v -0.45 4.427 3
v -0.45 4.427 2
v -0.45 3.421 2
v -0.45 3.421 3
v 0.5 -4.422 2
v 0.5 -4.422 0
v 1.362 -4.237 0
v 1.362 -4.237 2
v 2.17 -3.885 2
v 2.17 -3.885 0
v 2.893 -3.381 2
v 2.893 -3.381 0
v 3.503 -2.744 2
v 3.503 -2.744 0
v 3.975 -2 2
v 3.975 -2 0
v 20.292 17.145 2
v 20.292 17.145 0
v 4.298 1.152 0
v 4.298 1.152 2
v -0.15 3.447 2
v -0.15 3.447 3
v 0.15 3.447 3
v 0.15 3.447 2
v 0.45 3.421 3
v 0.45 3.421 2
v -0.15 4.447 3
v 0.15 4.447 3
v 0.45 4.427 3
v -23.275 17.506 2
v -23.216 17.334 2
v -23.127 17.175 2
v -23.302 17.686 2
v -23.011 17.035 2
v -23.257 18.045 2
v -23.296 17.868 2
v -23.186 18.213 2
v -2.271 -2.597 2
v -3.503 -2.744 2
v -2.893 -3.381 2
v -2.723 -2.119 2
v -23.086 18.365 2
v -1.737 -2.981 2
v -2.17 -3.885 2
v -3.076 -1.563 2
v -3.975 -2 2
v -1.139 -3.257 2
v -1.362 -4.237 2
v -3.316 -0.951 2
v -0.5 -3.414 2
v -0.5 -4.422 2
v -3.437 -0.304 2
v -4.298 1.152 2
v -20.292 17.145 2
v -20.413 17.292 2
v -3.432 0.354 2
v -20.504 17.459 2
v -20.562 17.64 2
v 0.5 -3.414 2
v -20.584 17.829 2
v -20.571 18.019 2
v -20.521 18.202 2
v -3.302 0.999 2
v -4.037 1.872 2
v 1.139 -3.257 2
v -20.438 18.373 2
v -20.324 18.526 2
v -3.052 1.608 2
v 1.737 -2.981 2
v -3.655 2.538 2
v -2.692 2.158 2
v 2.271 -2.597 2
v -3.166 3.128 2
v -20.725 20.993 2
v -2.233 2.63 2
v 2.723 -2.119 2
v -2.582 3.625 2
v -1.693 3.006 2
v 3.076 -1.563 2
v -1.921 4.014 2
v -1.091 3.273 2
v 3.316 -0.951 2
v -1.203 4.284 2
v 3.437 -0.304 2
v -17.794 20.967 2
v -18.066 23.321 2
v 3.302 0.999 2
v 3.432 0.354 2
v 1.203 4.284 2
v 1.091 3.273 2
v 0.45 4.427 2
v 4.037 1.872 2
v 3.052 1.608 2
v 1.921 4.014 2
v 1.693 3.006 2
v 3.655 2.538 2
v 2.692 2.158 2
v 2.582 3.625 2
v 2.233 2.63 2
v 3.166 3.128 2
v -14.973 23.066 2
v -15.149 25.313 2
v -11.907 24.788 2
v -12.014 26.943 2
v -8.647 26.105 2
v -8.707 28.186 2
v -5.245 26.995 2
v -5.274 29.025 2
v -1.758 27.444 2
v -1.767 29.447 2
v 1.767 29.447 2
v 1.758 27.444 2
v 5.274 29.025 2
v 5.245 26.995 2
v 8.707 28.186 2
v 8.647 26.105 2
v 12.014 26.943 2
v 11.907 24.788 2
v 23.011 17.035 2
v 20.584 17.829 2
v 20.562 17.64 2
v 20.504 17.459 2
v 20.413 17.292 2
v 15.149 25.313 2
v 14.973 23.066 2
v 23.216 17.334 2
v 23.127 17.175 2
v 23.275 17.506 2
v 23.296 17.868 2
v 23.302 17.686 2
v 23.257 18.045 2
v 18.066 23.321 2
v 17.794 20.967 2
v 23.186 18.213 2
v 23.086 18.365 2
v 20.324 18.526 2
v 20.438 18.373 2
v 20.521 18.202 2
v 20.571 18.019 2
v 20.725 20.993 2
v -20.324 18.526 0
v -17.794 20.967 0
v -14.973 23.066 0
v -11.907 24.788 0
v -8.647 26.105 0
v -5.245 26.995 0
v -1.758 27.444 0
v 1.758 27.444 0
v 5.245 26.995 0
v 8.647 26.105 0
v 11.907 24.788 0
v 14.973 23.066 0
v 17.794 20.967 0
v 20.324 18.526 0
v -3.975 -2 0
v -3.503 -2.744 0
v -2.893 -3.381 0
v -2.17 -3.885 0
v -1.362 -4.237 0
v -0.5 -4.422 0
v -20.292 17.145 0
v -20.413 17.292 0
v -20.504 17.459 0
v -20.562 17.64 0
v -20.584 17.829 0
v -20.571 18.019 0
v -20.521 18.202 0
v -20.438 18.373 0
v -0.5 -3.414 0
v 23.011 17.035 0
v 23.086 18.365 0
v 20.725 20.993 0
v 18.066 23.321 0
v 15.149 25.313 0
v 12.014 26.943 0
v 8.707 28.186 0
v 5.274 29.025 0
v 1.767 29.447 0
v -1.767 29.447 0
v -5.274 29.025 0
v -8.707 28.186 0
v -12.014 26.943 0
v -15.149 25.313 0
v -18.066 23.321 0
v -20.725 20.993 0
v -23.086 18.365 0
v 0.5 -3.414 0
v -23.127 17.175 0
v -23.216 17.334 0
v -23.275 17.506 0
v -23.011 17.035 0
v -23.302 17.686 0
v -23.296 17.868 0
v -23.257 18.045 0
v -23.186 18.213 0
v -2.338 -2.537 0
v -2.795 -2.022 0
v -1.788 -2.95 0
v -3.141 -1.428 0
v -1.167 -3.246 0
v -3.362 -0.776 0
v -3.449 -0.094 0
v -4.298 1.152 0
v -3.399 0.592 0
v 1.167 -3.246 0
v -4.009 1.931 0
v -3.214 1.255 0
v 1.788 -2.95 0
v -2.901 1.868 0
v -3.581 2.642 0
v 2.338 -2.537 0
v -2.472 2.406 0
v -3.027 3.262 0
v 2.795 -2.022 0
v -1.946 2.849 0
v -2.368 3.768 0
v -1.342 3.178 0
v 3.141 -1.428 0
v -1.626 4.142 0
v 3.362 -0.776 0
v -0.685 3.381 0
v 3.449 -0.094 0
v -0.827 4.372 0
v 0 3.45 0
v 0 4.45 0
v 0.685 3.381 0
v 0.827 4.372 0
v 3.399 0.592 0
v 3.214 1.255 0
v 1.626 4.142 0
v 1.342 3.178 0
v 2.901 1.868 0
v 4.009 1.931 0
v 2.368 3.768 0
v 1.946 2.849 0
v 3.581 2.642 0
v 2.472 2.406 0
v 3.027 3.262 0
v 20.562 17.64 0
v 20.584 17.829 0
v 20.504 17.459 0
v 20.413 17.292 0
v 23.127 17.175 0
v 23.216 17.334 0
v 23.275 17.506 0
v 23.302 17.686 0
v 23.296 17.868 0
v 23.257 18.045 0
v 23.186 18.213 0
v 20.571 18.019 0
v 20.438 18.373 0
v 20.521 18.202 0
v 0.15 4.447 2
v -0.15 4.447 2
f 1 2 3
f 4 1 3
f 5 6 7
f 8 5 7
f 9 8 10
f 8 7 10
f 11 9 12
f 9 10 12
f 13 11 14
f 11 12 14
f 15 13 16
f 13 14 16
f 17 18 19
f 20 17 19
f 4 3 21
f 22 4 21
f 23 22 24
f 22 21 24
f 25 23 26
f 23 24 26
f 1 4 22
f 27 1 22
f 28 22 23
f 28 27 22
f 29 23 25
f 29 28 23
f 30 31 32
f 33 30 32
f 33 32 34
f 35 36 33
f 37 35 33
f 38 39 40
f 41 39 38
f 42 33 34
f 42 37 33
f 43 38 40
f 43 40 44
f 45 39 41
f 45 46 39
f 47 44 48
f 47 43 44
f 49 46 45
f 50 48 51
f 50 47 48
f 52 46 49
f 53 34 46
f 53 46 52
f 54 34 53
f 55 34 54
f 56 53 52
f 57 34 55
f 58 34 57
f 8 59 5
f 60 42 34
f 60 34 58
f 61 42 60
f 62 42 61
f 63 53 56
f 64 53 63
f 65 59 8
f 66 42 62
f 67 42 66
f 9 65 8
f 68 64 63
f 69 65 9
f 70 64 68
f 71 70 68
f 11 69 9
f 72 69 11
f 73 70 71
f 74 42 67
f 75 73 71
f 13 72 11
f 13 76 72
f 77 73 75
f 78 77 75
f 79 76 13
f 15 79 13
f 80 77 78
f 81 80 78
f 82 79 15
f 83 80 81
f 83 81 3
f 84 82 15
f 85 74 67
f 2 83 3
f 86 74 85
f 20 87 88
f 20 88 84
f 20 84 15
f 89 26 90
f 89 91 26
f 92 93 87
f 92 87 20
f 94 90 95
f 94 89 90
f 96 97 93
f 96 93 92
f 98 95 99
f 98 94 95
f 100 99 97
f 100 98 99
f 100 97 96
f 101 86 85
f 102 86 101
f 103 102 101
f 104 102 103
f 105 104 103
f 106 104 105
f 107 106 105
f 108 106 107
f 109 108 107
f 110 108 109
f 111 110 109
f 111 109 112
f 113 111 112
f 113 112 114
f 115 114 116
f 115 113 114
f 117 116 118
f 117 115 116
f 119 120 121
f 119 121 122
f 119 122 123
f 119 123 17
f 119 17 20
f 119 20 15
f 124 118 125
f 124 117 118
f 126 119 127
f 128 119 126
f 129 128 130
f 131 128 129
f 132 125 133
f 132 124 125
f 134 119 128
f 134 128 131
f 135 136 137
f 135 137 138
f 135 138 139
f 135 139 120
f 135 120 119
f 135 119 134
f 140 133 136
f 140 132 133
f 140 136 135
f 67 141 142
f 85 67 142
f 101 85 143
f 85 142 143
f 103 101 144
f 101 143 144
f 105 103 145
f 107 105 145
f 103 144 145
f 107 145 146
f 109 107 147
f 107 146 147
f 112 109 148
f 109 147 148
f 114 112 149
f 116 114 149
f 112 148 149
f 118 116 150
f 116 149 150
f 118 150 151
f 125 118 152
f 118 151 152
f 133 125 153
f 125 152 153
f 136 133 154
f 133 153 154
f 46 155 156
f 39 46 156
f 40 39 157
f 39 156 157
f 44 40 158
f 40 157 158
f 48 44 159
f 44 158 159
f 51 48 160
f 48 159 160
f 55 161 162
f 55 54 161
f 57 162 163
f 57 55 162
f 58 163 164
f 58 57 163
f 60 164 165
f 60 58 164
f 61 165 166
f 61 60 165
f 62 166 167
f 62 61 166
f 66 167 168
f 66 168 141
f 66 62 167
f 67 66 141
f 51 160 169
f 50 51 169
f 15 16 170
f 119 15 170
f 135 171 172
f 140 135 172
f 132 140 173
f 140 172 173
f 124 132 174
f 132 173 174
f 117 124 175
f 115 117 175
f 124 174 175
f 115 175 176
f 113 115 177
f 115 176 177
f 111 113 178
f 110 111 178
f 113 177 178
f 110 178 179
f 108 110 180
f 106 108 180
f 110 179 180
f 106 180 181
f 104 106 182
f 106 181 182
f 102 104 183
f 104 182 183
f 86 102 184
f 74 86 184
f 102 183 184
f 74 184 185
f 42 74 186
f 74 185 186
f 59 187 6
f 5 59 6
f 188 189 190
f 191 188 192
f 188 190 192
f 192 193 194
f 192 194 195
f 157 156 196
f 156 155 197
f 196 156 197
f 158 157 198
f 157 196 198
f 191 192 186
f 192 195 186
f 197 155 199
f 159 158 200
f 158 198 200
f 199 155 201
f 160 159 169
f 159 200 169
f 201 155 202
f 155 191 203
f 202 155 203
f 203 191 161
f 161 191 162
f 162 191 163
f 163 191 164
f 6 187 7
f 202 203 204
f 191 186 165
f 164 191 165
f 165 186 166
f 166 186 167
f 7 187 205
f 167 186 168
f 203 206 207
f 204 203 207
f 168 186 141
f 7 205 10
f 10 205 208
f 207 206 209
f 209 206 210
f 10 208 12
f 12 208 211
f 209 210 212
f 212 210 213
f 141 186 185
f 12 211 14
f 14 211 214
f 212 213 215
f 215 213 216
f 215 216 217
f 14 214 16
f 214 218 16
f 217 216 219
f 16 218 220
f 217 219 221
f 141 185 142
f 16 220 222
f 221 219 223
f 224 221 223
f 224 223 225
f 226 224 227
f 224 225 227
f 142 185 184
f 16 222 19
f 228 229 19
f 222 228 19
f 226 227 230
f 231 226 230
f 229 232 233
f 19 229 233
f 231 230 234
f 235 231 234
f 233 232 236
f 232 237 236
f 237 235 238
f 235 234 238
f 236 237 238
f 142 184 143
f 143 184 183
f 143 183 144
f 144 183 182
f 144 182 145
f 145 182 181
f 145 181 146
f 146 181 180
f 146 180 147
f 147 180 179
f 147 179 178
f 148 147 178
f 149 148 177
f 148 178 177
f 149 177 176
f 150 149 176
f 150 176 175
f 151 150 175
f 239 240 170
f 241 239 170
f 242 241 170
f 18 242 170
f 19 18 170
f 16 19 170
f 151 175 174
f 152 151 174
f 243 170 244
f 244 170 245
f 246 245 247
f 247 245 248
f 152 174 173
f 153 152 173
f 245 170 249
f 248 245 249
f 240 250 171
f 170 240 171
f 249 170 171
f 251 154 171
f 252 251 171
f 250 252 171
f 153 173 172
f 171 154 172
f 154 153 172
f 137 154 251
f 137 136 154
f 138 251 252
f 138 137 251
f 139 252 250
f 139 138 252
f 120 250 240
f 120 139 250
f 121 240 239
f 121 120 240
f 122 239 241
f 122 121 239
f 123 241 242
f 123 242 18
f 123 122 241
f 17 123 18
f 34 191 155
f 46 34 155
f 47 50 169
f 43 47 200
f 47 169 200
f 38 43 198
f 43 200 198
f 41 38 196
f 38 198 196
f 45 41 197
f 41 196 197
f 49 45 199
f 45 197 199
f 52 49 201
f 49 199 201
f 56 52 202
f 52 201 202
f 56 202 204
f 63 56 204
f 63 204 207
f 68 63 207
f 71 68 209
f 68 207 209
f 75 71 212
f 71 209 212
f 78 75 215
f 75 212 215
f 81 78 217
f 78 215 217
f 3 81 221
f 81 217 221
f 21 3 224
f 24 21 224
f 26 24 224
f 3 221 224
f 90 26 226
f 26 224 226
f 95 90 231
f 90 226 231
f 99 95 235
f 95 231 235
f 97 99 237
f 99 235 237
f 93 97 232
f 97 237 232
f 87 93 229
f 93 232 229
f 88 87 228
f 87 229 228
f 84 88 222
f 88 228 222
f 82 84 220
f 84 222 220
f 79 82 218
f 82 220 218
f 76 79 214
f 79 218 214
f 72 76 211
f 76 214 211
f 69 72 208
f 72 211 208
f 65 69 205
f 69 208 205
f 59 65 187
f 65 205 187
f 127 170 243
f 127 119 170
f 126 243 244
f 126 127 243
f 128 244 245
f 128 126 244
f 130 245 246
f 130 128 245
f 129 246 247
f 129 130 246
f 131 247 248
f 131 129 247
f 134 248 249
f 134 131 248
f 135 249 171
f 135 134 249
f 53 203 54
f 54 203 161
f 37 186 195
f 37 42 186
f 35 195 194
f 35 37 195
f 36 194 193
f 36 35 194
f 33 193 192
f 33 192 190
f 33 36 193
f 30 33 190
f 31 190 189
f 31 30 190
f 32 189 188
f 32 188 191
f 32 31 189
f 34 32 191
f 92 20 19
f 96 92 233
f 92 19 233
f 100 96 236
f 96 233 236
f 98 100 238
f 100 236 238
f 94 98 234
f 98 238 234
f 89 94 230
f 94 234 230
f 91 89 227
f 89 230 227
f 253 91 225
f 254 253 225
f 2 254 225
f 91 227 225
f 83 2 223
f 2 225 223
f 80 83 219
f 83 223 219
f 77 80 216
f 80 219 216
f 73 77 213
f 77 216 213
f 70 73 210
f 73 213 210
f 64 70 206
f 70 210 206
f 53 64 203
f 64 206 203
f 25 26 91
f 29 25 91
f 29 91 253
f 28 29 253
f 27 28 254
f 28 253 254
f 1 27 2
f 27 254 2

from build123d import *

# Parameters (mm, degrees)
F1_DEPTH = 2
F3_DEPTH = 1
F4_R     = 1


with BuildPart() as f1:
    # F0 (on Top) → F1 (new body)
    with BuildSketch(Plane.XY):
        with BuildLine():
            ThreePointArc((4.298409, 1.1516), (4.426787, -0.453934), (3.975236, -2))
            Line((3.975236, -2), (23.632209, 17.656973))
            ThreePointArc((23.632209, 17.656973), (0, 29.5), (-23.632209, 17.656973))
            Line((-23.632209, 17.656973), (-3.975236, -2))
            ThreePointArc((-3.975236, -2), (-4.426787, -0.453934), (-4.298409, 1.1516))
            Line((-4.298409, 1.1516), (-20.955081, 17.808273))
            ThreePointArc((-20.955081, 17.808273), (0, 27.5), (20.955081, 17.808273))
            Line((20.955081, 17.808273), (4.298409, 1.1516))
        make_face()
        with BuildLine():
            Line((0.5, -3.413576), (0.5, -4.421821))
            ThreePointArc((0.5, -4.421821), (2.544256, -3.650926), (3.975236, -2))
            ThreePointArc((3.975236, -2), (4.426787, -0.453934), (4.298409, 1.1516))
            ThreePointArc((4.298409, 1.1516), (0, 4.45), (-4.298409, 1.1516))
            ThreePointArc((-4.298409, 1.1516), (-4.426787, -0.453934), (-3.975236, -2))
            ThreePointArc((-3.975236, -2), (-2.544256, -3.650926), (-0.5, -4.421821))
            Line((-0.5, -4.421821), (-0.5, -3.413576))
            ThreePointArc((-0.5, -3.413576), (0, 3.45), (0.5, -3.413576))
        make_face()
    extrude(amount=F1_DEPTH)

    # F2 (on face) → F3 (join)
    with BuildSketch(Plane.XY.offset(2)):
        with BuildLine():
            Line((0.45, 3.420526), (0.45, 4.427189))
            ThreePointArc((0.45, 4.427189), (0, 4.45), (-0.45, 4.427189))
            Line((-0.45, 4.427189), (-0.45, 3.420526))
            ThreePointArc((-0.45, 3.420526), (0, 3.45), (0.45, 3.420526))
        make_face()
    extrude(amount=F3_DEPTH)

    # F4
    f4_edges = [f1.edges().sort_by_distance(p)[0] for p in [
        (-23.632209, 17.656973, 1),
        (-20.955081, 17.808273, 1),
        (23.632209, 17.656973, 1),
        (20.955081, 17.808273, 1),
    ]]
    fillet(f4_edges, radius=F4_R)


solid = f1.part
